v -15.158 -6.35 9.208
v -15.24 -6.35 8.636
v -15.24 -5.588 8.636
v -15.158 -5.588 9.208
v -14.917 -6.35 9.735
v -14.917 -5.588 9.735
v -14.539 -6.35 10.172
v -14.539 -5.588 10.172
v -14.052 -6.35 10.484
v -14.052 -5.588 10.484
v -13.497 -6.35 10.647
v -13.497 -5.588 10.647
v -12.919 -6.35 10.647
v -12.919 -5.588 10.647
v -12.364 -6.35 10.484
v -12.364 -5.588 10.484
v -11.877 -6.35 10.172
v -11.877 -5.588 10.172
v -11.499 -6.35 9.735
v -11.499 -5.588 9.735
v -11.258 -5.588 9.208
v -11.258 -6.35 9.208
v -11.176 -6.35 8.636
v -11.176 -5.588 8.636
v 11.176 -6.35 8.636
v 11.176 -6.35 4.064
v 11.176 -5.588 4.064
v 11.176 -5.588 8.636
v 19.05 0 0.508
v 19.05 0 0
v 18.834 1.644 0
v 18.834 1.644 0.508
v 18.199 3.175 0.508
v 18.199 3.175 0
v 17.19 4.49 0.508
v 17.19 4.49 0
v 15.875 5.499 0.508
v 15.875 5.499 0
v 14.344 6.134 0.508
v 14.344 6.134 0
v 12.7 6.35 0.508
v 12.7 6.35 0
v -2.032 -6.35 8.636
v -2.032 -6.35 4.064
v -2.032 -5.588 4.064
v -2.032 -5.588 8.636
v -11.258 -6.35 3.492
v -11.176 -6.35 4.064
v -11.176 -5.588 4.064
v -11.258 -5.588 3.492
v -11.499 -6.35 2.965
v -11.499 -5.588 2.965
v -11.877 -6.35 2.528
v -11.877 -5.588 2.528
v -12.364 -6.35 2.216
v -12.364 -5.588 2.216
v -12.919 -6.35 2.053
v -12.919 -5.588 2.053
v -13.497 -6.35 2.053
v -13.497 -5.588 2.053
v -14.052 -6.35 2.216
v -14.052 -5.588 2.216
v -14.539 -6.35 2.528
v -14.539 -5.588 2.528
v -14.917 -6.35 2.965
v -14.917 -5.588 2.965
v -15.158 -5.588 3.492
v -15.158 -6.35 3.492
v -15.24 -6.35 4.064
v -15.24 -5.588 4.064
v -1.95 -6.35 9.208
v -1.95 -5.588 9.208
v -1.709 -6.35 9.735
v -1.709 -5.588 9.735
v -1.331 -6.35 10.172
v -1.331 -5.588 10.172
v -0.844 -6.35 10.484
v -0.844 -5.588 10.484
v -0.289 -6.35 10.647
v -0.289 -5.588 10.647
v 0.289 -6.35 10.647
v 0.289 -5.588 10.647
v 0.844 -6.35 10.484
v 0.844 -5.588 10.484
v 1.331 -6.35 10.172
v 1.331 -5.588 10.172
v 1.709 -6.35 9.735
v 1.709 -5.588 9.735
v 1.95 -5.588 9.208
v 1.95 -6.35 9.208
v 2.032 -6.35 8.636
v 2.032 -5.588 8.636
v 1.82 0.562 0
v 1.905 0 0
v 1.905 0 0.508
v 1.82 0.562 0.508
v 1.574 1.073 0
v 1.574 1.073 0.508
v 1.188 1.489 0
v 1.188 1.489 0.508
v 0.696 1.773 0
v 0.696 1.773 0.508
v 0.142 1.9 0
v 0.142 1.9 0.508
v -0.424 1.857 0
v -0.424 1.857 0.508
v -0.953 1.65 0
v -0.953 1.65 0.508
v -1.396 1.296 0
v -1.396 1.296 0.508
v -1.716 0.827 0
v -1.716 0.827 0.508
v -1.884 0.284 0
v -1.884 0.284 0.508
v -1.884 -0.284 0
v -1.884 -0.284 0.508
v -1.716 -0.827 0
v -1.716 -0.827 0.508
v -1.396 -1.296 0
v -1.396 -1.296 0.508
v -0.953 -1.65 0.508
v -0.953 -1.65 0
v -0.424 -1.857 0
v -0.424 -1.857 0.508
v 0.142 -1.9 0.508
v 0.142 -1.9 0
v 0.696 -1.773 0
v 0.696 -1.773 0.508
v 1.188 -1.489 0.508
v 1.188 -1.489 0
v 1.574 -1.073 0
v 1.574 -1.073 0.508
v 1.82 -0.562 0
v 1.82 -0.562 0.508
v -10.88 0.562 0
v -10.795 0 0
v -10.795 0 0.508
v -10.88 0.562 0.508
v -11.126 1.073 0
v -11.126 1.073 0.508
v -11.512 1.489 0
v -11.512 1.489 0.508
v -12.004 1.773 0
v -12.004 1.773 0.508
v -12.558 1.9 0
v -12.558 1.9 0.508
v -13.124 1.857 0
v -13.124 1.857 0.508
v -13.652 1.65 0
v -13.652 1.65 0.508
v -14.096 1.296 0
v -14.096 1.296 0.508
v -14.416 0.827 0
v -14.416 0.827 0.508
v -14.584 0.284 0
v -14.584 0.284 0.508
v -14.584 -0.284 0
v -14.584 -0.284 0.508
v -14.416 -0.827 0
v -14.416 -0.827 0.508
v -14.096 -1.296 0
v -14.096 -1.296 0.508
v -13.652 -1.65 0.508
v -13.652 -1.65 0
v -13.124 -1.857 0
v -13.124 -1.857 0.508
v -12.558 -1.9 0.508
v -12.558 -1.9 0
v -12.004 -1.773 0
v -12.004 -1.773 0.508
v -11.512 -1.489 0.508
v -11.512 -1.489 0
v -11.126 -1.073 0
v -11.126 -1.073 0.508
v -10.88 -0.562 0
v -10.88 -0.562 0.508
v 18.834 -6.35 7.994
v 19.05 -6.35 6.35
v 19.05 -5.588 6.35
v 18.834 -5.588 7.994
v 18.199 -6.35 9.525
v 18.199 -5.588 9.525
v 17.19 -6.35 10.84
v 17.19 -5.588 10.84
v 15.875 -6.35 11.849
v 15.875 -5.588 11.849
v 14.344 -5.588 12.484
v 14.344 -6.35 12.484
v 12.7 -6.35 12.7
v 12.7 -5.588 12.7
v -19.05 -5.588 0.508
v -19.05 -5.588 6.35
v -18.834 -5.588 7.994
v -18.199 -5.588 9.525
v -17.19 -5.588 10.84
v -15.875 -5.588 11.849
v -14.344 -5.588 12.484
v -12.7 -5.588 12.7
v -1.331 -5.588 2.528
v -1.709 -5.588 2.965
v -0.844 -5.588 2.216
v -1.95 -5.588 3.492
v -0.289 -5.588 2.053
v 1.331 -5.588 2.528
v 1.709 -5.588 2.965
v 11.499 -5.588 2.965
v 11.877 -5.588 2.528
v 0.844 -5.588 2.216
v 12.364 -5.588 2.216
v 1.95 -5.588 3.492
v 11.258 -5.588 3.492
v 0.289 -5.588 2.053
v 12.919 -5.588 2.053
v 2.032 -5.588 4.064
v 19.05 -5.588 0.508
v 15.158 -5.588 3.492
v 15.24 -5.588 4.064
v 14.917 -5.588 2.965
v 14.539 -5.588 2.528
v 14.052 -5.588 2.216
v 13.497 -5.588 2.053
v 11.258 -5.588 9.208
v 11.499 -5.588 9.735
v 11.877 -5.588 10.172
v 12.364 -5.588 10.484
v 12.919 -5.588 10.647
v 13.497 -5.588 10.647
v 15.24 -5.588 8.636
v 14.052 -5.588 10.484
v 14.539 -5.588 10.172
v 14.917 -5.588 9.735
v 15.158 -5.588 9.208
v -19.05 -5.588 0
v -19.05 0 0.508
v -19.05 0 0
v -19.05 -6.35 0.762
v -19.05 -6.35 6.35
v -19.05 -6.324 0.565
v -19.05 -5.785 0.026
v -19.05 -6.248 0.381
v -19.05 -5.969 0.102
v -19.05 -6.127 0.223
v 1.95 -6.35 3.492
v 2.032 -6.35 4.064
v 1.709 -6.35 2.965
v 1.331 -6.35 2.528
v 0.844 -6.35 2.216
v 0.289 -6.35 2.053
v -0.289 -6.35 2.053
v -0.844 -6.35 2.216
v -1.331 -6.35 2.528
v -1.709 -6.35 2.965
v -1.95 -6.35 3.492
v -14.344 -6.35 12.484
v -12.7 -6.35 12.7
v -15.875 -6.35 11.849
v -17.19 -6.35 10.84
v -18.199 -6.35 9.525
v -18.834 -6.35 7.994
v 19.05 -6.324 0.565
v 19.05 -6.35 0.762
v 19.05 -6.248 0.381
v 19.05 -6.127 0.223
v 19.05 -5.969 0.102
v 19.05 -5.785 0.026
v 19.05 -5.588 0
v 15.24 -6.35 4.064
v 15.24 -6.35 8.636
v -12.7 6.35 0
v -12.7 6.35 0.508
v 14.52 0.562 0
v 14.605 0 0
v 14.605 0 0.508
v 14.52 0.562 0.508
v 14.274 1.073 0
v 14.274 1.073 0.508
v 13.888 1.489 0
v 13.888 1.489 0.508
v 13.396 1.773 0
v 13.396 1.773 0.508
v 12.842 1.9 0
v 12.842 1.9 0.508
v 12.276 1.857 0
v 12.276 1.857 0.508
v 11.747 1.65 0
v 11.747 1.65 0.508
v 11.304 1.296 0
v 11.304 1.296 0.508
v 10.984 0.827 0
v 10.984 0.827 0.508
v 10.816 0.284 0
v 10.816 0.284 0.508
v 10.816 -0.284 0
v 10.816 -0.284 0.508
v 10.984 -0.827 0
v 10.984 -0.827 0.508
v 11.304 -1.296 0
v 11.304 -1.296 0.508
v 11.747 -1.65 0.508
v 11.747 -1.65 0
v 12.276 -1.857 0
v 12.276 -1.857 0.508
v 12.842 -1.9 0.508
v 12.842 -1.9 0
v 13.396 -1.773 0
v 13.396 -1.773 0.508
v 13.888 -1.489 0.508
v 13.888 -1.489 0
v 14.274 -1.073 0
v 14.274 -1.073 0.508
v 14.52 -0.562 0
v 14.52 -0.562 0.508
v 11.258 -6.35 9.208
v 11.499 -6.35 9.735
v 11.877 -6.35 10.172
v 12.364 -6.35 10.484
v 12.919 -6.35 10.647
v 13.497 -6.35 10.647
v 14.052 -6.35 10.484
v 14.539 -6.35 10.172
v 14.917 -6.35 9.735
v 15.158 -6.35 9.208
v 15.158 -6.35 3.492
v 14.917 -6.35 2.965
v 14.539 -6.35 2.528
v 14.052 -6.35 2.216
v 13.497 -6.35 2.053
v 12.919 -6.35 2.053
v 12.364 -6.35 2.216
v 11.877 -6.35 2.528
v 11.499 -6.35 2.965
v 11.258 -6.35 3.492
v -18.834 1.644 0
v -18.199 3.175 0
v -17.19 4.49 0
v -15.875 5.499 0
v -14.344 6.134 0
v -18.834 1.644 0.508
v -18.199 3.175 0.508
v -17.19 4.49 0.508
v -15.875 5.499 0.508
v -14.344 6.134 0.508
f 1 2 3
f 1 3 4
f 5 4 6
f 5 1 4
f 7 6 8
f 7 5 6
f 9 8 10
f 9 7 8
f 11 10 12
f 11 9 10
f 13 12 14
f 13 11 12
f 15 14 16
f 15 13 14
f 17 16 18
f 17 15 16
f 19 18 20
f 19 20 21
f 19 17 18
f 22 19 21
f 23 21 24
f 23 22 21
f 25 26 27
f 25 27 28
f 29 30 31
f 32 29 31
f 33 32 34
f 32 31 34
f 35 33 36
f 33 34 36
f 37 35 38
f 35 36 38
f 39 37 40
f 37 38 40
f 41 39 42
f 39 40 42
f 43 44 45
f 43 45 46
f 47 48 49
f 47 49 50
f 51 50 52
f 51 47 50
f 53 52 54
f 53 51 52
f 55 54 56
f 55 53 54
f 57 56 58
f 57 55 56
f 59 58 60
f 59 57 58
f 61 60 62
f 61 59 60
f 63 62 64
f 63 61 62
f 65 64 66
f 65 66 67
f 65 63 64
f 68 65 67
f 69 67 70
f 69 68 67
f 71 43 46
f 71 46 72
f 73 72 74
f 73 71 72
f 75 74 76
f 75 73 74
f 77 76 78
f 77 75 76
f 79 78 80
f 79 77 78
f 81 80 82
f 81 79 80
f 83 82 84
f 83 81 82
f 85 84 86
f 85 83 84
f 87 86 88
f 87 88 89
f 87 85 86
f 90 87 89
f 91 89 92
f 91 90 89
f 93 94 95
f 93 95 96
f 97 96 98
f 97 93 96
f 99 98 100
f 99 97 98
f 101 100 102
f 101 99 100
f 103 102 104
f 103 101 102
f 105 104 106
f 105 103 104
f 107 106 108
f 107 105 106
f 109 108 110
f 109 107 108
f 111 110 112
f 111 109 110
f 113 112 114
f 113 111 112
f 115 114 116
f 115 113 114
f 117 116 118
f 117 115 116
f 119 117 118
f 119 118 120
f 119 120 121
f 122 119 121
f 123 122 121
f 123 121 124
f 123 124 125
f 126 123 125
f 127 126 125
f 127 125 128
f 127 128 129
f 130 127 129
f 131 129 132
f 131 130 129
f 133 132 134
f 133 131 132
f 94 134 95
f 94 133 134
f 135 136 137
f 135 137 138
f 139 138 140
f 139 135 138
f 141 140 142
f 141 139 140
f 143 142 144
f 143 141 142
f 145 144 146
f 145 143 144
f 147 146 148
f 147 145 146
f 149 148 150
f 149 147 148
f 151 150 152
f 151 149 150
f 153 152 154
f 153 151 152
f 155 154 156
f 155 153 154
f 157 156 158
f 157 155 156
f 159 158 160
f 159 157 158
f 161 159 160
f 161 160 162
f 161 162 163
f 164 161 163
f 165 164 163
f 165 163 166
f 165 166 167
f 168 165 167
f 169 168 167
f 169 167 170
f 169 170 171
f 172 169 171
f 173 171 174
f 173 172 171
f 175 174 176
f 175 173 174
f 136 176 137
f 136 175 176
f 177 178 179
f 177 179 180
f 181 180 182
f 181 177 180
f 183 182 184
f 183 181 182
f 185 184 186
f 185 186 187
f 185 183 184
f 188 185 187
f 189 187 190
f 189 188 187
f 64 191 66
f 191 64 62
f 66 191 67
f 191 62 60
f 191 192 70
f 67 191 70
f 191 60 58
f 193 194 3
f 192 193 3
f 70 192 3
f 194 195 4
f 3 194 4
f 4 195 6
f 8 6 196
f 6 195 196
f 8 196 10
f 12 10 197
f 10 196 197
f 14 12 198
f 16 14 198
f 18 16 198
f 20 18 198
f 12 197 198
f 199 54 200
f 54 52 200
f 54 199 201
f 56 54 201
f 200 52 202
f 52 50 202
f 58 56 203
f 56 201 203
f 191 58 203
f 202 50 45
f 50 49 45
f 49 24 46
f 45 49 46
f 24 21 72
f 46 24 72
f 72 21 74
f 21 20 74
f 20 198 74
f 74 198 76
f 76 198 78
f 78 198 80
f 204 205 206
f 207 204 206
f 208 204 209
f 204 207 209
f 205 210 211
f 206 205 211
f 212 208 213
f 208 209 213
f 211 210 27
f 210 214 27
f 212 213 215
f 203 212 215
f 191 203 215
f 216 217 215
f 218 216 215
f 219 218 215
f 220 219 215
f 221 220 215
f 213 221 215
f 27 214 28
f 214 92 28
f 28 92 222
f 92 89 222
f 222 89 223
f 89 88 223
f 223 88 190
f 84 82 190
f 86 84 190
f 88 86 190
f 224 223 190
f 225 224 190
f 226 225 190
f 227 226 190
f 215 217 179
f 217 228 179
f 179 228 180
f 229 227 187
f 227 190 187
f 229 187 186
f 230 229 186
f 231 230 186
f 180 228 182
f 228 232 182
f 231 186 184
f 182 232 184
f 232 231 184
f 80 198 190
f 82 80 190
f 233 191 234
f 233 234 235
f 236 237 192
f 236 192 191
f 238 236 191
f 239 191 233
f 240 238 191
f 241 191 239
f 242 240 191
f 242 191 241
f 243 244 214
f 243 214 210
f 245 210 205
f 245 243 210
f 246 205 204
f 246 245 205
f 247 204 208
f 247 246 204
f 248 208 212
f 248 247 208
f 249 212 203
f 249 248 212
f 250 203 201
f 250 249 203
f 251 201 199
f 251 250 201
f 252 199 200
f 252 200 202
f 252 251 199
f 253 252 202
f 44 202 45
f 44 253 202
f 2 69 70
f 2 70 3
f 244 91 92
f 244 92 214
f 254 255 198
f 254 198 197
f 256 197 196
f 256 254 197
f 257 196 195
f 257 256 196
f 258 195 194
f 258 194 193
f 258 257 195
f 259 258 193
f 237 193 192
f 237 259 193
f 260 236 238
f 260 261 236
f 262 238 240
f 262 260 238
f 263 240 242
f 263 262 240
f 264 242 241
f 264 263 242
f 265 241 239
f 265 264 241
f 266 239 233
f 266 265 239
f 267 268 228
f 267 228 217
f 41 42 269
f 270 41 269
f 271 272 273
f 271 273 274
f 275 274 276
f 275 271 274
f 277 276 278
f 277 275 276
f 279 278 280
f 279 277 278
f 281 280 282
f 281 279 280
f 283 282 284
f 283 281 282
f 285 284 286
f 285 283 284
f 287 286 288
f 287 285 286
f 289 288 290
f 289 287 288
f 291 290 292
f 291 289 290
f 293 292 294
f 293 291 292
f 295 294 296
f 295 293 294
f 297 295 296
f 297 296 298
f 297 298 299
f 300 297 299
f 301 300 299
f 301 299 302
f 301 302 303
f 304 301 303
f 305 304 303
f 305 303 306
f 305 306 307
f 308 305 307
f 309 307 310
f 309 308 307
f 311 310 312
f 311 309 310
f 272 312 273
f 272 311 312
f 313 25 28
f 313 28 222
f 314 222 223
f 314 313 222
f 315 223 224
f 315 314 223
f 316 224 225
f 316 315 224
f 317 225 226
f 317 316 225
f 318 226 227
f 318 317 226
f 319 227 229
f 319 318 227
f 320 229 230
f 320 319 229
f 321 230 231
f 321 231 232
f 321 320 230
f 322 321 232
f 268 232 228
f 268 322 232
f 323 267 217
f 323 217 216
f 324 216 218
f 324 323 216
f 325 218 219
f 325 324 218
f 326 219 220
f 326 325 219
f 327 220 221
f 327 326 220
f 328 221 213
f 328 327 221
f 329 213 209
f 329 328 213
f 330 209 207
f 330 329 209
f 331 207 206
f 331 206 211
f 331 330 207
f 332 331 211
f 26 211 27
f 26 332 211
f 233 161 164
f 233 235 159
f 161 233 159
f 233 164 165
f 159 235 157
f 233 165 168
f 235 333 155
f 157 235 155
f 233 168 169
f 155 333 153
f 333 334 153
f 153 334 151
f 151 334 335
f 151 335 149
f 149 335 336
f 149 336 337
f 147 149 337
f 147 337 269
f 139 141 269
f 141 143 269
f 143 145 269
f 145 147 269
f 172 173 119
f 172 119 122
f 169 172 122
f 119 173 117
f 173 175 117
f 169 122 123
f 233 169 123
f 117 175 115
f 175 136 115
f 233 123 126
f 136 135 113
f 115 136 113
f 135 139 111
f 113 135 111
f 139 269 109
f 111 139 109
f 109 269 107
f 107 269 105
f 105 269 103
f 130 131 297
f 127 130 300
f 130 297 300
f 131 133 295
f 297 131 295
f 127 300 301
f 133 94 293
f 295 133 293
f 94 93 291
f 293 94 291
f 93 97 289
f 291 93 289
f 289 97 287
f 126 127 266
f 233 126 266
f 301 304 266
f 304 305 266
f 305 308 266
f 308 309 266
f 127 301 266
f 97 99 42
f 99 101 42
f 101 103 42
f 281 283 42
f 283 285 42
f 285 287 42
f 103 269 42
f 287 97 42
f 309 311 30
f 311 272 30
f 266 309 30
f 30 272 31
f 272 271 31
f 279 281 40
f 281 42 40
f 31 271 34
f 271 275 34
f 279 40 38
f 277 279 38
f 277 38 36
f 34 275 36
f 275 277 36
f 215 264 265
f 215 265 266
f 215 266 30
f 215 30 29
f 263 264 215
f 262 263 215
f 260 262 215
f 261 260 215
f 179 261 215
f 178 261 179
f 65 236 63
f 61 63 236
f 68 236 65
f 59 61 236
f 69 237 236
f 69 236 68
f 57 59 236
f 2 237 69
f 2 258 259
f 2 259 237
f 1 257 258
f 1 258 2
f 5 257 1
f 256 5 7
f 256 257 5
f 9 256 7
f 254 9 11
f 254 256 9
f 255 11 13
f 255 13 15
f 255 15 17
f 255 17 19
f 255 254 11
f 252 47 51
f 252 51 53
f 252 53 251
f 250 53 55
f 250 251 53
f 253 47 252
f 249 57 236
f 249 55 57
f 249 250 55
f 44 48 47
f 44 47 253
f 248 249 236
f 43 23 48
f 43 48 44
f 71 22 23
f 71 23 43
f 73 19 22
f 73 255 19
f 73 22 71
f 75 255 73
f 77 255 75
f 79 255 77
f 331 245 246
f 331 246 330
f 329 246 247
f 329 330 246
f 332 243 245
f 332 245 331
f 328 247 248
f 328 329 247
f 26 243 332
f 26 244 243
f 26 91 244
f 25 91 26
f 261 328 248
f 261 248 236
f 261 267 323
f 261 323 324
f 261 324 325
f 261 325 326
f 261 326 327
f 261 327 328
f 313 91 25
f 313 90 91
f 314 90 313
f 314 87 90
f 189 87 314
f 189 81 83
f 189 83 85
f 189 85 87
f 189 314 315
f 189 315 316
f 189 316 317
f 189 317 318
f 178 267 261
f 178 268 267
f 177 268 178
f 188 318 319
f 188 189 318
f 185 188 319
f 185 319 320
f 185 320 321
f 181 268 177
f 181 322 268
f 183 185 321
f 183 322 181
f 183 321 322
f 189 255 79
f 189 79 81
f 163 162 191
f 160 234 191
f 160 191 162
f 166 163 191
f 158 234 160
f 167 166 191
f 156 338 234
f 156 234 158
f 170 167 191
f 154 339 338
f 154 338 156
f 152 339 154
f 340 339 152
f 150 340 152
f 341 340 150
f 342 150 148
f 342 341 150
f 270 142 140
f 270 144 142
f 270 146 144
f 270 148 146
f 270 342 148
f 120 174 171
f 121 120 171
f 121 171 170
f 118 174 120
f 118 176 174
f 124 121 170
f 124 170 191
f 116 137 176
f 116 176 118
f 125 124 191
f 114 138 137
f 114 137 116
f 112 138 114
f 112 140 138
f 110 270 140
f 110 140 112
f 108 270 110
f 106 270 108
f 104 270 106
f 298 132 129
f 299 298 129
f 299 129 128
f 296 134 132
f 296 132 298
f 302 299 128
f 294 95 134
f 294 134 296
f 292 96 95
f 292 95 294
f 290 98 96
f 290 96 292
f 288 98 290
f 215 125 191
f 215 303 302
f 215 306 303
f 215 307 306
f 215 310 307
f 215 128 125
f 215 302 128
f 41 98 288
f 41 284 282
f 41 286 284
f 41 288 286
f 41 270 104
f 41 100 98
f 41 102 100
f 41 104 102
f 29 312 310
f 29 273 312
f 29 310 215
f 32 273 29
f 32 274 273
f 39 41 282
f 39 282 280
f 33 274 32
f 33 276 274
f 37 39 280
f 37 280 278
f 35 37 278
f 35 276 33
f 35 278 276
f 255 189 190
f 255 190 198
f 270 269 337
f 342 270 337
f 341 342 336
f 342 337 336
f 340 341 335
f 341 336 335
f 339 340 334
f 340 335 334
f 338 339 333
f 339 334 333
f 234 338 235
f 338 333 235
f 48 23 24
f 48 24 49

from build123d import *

# Parameters (mm, degrees)
F1_R     = 1.905
F2_DEPTH = 0.508
F8_DEPTH = 0.762
F9_R     = 0.762


with BuildPart() as f2:
    # F1 (on Top) → F2 (new body)
    with BuildSketch(Plane.XY):
        with BuildLine():
            ThreePointArc((19.05, 0), (17.190128, 4.490128), (12.7, 6.35))
            Line((12.7, 6.35), (-12.7, 6.35))
            ThreePointArc((-12.7, 6.35), (-17.190128, 4.490128), (-19.05, 0))
            Line((-19.05, 0), (-19.05, -6.35))
            Line((-19.05, -6.35), (19.05, -6.35))
            Line((19.05, -6.35), (19.05, 0))
        make_face()
        with Locations((-12.7, 0)):
            Circle(F1_R, mode=Mode.SUBTRACT)
        Circle(F1_R, mode=Mode.SUBTRACT)
        with Locations((12.7, 0)):
            Circle(F1_R, mode=Mode.SUBTRACT)
    extrude(amount=F2_DEPTH)

    # F7 (on offset) → F8 (join)
    with BuildSketch(Plane.XZ.offset(6.35)):
        with BuildLine():
            Line((-19.05, 6.35), (-19.05, 0))
            Line((-19.05, 0), (19.05, 0))
            Line((19.05, 0), (19.05, 6.35))
            ThreePointArc((19.05, 6.35), (17.190128, 10.840128), (12.7, 12.7))
            Line((12.7, 12.7), (-12.7, 12.7))
            ThreePointArc((-12.7, 12.7), (-17.190128, 10.840128), (-19.05, 6.35))
        make_face()
        with BuildLine():
            Line((-11.176, 8.636), (-11.176, 4.064))
            ThreePointArc((-11.176, 4.064), (-13.208, 2.032), (-15.24, 4.064))
            Line((-15.24, 4.064), (-15.24, 8.636))
            ThreePointArc((-15.24, 8.636), (-13.208, 10.668), (-11.176, 8.636))
        make_face(mode=Mode.SUBTRACT)
        with BuildLine():
            Line((-2.032, 4.064), (-2.032, 8.636))
            ThreePointArc((-2.032, 8.636), (0, 10.668), (2.032, 8.636))
            Line((2.032, 8.636), (2.032, 4.064))
            ThreePointArc((2.032, 4.064), (0, 2.032), (-2.032, 4.064))
        make_face(mode=Mode.SUBTRACT)
        with BuildLine():
            Line((15.24, 8.636), (15.24, 4.064))
            ThreePointArc((15.24, 4.064), (13.208, 2.032), (11.176, 4.064))
            Line((11.176, 4.064), (11.176, 8.636))
            ThreePointArc((11.176, 8.636), (13.208, 10.668), (15.24, 8.636))
        make_face(mode=Mode.SUBTRACT)
    extrude(amount=-F8_DEPTH)

    # F9
    f9_edges = [f2.edges().sort_by_distance(p)[0] for p in [
        (0, -6.35, 0),
    ]]
    fillet(f9_edges, radius=F9_R)


solid = f2.part
